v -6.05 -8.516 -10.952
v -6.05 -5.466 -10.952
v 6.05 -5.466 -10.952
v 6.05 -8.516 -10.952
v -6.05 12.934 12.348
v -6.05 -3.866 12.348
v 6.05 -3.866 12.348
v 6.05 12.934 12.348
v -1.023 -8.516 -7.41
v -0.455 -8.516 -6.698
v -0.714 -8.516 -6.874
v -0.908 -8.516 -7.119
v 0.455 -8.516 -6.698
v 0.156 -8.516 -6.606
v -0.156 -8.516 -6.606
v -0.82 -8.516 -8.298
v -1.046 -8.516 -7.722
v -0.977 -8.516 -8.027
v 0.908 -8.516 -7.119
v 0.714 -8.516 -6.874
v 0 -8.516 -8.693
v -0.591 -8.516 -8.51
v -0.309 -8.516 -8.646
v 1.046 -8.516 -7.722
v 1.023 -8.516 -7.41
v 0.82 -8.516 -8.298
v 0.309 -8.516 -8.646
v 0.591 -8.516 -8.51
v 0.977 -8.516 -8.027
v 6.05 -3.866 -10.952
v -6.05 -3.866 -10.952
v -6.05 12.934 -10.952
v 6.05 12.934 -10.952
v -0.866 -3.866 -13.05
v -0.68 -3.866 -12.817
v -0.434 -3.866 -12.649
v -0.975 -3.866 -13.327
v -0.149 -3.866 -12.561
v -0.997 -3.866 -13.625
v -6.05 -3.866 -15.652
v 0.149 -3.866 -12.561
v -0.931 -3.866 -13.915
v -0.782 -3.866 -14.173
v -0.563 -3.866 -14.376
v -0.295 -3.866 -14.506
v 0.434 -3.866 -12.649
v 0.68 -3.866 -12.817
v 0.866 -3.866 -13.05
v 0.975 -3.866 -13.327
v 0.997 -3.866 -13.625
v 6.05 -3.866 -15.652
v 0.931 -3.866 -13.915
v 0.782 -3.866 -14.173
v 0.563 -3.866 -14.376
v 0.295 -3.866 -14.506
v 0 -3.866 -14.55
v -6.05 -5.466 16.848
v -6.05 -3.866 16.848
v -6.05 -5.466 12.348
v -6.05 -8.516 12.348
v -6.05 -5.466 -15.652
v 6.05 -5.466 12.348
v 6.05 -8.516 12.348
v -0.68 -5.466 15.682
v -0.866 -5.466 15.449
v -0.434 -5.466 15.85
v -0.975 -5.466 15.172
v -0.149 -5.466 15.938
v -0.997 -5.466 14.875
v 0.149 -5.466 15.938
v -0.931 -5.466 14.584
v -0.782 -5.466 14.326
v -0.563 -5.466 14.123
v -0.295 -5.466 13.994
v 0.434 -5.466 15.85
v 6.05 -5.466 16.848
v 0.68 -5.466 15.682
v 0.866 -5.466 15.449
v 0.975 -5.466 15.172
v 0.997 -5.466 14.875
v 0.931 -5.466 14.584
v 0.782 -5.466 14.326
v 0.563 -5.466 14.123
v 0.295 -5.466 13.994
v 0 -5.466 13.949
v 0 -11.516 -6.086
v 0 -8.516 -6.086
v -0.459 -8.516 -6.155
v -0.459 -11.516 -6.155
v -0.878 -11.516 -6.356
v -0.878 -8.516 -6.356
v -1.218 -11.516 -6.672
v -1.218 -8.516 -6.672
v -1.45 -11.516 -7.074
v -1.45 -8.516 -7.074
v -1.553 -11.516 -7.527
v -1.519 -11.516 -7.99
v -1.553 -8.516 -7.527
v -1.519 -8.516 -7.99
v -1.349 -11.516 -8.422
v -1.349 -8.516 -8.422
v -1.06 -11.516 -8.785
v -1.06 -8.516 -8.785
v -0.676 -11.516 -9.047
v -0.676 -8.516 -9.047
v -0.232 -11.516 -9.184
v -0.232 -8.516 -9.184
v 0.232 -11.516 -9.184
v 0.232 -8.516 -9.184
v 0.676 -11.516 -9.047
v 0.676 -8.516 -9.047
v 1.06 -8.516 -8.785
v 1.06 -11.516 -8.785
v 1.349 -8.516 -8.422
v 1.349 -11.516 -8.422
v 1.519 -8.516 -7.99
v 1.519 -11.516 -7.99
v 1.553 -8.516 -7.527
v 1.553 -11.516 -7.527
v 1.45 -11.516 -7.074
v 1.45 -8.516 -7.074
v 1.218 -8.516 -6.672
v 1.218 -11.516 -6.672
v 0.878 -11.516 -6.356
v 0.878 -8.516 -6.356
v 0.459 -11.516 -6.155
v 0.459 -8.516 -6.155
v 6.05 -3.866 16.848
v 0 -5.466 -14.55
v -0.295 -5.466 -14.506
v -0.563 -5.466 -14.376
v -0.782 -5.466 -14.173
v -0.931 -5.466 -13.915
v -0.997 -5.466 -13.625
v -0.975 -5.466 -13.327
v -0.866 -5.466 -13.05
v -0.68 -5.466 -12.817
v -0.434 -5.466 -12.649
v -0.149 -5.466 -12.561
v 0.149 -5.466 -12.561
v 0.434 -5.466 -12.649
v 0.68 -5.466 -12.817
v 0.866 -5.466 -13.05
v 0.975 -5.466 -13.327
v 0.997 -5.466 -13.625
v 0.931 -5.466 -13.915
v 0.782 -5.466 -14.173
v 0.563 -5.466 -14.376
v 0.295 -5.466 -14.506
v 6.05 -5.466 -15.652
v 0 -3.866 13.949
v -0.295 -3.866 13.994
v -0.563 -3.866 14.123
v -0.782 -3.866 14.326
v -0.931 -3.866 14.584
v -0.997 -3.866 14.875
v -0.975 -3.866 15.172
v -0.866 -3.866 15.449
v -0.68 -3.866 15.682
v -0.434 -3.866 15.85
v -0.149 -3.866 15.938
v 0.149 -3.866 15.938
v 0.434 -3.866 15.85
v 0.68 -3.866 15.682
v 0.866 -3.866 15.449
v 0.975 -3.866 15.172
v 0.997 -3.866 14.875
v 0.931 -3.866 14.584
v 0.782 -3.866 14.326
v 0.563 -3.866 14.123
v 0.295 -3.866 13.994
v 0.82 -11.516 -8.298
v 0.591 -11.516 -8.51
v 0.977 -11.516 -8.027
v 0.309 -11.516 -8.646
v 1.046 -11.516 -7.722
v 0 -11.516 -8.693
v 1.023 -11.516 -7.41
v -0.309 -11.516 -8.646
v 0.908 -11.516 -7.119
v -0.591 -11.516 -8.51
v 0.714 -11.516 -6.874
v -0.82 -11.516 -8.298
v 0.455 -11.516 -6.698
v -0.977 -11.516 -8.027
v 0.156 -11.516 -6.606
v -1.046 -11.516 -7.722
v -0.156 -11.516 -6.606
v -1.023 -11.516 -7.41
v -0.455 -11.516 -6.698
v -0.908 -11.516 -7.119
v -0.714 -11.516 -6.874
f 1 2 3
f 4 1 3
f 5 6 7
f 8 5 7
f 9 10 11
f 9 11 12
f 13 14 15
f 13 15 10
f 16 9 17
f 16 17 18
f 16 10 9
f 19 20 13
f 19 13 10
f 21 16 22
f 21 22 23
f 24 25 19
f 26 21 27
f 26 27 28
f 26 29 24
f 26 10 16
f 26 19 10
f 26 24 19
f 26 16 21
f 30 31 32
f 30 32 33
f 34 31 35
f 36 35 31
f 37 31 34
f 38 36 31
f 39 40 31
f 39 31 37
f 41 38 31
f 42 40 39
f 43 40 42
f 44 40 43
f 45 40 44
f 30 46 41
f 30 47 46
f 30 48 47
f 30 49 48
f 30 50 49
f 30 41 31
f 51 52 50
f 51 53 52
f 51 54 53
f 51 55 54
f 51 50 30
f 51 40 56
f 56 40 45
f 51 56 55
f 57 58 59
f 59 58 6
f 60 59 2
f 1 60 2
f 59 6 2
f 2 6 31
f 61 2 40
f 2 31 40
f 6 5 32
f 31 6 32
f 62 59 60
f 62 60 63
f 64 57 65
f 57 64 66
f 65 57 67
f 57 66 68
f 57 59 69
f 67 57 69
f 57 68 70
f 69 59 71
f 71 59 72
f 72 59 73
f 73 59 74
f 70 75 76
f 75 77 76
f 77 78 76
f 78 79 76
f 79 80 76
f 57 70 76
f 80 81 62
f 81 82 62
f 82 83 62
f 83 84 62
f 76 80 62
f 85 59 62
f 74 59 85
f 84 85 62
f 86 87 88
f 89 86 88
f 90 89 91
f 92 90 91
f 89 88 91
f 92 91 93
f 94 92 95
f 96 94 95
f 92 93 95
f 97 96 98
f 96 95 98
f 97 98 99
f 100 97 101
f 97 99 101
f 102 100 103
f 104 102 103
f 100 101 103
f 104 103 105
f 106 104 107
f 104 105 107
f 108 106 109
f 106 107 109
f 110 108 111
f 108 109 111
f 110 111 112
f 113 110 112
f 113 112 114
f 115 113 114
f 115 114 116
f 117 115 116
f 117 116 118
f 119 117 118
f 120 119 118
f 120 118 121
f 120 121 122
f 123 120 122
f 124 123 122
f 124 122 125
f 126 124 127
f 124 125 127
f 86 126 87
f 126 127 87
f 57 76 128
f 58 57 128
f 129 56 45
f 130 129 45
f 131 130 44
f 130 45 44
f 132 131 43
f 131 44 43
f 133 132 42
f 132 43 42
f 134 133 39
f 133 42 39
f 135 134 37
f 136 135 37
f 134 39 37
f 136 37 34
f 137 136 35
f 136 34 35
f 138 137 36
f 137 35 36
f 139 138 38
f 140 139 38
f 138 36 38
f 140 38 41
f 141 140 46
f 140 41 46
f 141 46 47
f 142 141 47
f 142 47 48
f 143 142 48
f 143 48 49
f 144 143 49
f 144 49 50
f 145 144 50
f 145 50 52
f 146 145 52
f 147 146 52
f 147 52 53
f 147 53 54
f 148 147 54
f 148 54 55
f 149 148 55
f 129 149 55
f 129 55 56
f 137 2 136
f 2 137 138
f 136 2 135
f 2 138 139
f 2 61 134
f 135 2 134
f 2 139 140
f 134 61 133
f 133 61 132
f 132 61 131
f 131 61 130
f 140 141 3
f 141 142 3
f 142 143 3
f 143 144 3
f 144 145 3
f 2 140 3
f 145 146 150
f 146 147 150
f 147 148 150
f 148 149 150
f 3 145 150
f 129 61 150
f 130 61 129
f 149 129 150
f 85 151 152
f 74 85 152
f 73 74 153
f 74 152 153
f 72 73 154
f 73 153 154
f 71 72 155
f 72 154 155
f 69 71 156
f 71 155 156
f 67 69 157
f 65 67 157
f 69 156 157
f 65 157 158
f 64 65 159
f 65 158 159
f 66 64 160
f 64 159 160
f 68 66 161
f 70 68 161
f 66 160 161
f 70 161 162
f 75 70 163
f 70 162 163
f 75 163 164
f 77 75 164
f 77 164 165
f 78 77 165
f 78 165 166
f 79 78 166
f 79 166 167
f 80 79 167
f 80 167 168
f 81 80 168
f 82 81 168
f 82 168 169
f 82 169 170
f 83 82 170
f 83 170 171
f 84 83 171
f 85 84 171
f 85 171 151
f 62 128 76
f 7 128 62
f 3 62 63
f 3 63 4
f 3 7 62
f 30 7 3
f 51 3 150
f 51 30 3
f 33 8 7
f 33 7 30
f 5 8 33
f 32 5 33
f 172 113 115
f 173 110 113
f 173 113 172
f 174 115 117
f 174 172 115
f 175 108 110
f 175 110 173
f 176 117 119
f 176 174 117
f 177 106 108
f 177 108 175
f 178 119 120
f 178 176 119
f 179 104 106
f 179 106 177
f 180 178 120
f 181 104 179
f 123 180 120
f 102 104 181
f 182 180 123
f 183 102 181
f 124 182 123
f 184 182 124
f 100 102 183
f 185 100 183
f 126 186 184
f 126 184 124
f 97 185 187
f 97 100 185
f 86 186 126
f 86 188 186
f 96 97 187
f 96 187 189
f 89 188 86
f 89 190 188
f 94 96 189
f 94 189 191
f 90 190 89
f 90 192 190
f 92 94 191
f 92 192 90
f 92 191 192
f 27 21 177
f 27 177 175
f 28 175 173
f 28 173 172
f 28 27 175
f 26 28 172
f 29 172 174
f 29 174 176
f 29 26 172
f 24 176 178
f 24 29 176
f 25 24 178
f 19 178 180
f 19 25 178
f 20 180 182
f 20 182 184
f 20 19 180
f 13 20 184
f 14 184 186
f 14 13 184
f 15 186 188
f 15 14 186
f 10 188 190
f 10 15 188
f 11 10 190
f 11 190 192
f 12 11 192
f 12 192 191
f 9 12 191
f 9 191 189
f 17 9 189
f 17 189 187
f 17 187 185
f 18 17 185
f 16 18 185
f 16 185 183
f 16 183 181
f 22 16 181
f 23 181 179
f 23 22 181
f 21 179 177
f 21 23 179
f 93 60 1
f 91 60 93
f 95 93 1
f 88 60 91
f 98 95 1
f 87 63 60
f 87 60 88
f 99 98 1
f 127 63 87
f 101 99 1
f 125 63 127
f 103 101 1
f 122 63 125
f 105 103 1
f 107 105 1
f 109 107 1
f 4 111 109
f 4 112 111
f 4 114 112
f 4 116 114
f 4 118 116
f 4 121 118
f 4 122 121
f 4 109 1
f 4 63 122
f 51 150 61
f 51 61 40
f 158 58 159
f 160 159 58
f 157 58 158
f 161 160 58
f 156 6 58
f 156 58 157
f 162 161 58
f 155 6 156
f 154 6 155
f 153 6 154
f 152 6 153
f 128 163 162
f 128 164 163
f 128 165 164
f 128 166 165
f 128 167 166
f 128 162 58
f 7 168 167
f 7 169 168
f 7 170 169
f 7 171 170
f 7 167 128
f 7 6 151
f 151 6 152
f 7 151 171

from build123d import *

# Parameters (mm, degrees)
SKETCH_3_W          = 32.5
SKETCH_3_H          = 21.45
EXTRUDE_1_DEPTH     = 6.05
CUT_EXTRUDE_START   = -3.86581
SKETCH_4_W          = 12.1
SKETCH_4_H          = 4.7
SKETCH_4_H_2        = 4.6
CUT_EXTRUDE_1_DEPTH = 26.951221363
CUT_EXTRUDE_START_2 = -5.46581
SKETCH_4_2_W        = 12.1
SKETCH_4_2_H        = 4.7
SKETCH_4_2_H_2      = 4.6
CUT_EXTRUDE_2_DEPTH = 17.619601363
SKETCH_5_R          = 1
CUT_EXTRUDE_3_DEPTH = 23.085411363
SKETCH_7_R          = 1.557821419
SKETCH_7_R_2        = 1.04903278
EXTRUDE_3_DEPTH     = 3


with BuildPart() as part:
    # 草图3 → 凸台-拉伸1 (new, symmetric)
    with BuildSketch(Plane(origin=(0, 0, 0), x_dir=(0, 0, -1), z_dir=(1, 0, 0))):
        with Locations((-0.5985, 2.2091)):
            Rectangle(SKETCH_3_W, SKETCH_3_H)
    extrude(amount=EXTRUDE_1_DEPTH, both=True)

    # 草图4 → 切除-拉伸1 (cut, through all)
    with BuildSketch(Plane(origin=(0, 0, 0), x_dir=(1, 0, 0), z_dir=(0, 1, 0)).offset(CUT_EXTRUDE_START)):
        with Locations((0, 13.30155)):
            Rectangle(SKETCH_4_W, SKETCH_4_H)
        with Locations((0, -14.6484)):
            Rectangle(SKETCH_4_W, SKETCH_4_H_2)
    extrude(amount=CUT_EXTRUDE_1_DEPTH, mode=Mode.SUBTRACT)

    # 草图4<2> → 切除-拉伸2 (cut, through all)
    with BuildSketch(Plane(origin=(0, 0, 0), x_dir=(1, 0, 0), z_dir=(0, 1, 0)).offset(CUT_EXTRUDE_START_2)):
        with Locations((0, 13.30155)):
            Rectangle(SKETCH_4_2_W, SKETCH_4_2_H)
        with Locations((0, -14.6484)):
            Rectangle(SKETCH_4_2_W, SKETCH_4_2_H_2)
    extrude(amount=-CUT_EXTRUDE_2_DEPTH, mode=Mode.SUBTRACT)

    # 草图5 → 切除-拉伸3 (cut, through all)
    with BuildSketch(Plane(origin=(0, 0, 0), x_dir=(1, 0, 0), z_dir=(0, 1, 0))):
        with Locations((0, 13.55)):
            Circle(SKETCH_5_R)
        with Locations((0, -14.949238683)):
            Circle(SKETCH_5_R)
    extrude(amount=-CUT_EXTRUDE_3_DEPTH, mode=Mode.SUBTRACT)

    # 草图7 → 凸台-拉伸3 (add)
    with BuildSketch(Plane.XZ.offset(8.5159)):
        with Locations((0, -7.64347992)):
            Circle(SKETCH_7_R)
        with Locations((0, -7.64347992)):
            Circle(SKETCH_7_R_2, mode=Mode.SUBTRACT)
    extrude(amount=EXTRUDE_3_DEPTH)


solid = part.part
